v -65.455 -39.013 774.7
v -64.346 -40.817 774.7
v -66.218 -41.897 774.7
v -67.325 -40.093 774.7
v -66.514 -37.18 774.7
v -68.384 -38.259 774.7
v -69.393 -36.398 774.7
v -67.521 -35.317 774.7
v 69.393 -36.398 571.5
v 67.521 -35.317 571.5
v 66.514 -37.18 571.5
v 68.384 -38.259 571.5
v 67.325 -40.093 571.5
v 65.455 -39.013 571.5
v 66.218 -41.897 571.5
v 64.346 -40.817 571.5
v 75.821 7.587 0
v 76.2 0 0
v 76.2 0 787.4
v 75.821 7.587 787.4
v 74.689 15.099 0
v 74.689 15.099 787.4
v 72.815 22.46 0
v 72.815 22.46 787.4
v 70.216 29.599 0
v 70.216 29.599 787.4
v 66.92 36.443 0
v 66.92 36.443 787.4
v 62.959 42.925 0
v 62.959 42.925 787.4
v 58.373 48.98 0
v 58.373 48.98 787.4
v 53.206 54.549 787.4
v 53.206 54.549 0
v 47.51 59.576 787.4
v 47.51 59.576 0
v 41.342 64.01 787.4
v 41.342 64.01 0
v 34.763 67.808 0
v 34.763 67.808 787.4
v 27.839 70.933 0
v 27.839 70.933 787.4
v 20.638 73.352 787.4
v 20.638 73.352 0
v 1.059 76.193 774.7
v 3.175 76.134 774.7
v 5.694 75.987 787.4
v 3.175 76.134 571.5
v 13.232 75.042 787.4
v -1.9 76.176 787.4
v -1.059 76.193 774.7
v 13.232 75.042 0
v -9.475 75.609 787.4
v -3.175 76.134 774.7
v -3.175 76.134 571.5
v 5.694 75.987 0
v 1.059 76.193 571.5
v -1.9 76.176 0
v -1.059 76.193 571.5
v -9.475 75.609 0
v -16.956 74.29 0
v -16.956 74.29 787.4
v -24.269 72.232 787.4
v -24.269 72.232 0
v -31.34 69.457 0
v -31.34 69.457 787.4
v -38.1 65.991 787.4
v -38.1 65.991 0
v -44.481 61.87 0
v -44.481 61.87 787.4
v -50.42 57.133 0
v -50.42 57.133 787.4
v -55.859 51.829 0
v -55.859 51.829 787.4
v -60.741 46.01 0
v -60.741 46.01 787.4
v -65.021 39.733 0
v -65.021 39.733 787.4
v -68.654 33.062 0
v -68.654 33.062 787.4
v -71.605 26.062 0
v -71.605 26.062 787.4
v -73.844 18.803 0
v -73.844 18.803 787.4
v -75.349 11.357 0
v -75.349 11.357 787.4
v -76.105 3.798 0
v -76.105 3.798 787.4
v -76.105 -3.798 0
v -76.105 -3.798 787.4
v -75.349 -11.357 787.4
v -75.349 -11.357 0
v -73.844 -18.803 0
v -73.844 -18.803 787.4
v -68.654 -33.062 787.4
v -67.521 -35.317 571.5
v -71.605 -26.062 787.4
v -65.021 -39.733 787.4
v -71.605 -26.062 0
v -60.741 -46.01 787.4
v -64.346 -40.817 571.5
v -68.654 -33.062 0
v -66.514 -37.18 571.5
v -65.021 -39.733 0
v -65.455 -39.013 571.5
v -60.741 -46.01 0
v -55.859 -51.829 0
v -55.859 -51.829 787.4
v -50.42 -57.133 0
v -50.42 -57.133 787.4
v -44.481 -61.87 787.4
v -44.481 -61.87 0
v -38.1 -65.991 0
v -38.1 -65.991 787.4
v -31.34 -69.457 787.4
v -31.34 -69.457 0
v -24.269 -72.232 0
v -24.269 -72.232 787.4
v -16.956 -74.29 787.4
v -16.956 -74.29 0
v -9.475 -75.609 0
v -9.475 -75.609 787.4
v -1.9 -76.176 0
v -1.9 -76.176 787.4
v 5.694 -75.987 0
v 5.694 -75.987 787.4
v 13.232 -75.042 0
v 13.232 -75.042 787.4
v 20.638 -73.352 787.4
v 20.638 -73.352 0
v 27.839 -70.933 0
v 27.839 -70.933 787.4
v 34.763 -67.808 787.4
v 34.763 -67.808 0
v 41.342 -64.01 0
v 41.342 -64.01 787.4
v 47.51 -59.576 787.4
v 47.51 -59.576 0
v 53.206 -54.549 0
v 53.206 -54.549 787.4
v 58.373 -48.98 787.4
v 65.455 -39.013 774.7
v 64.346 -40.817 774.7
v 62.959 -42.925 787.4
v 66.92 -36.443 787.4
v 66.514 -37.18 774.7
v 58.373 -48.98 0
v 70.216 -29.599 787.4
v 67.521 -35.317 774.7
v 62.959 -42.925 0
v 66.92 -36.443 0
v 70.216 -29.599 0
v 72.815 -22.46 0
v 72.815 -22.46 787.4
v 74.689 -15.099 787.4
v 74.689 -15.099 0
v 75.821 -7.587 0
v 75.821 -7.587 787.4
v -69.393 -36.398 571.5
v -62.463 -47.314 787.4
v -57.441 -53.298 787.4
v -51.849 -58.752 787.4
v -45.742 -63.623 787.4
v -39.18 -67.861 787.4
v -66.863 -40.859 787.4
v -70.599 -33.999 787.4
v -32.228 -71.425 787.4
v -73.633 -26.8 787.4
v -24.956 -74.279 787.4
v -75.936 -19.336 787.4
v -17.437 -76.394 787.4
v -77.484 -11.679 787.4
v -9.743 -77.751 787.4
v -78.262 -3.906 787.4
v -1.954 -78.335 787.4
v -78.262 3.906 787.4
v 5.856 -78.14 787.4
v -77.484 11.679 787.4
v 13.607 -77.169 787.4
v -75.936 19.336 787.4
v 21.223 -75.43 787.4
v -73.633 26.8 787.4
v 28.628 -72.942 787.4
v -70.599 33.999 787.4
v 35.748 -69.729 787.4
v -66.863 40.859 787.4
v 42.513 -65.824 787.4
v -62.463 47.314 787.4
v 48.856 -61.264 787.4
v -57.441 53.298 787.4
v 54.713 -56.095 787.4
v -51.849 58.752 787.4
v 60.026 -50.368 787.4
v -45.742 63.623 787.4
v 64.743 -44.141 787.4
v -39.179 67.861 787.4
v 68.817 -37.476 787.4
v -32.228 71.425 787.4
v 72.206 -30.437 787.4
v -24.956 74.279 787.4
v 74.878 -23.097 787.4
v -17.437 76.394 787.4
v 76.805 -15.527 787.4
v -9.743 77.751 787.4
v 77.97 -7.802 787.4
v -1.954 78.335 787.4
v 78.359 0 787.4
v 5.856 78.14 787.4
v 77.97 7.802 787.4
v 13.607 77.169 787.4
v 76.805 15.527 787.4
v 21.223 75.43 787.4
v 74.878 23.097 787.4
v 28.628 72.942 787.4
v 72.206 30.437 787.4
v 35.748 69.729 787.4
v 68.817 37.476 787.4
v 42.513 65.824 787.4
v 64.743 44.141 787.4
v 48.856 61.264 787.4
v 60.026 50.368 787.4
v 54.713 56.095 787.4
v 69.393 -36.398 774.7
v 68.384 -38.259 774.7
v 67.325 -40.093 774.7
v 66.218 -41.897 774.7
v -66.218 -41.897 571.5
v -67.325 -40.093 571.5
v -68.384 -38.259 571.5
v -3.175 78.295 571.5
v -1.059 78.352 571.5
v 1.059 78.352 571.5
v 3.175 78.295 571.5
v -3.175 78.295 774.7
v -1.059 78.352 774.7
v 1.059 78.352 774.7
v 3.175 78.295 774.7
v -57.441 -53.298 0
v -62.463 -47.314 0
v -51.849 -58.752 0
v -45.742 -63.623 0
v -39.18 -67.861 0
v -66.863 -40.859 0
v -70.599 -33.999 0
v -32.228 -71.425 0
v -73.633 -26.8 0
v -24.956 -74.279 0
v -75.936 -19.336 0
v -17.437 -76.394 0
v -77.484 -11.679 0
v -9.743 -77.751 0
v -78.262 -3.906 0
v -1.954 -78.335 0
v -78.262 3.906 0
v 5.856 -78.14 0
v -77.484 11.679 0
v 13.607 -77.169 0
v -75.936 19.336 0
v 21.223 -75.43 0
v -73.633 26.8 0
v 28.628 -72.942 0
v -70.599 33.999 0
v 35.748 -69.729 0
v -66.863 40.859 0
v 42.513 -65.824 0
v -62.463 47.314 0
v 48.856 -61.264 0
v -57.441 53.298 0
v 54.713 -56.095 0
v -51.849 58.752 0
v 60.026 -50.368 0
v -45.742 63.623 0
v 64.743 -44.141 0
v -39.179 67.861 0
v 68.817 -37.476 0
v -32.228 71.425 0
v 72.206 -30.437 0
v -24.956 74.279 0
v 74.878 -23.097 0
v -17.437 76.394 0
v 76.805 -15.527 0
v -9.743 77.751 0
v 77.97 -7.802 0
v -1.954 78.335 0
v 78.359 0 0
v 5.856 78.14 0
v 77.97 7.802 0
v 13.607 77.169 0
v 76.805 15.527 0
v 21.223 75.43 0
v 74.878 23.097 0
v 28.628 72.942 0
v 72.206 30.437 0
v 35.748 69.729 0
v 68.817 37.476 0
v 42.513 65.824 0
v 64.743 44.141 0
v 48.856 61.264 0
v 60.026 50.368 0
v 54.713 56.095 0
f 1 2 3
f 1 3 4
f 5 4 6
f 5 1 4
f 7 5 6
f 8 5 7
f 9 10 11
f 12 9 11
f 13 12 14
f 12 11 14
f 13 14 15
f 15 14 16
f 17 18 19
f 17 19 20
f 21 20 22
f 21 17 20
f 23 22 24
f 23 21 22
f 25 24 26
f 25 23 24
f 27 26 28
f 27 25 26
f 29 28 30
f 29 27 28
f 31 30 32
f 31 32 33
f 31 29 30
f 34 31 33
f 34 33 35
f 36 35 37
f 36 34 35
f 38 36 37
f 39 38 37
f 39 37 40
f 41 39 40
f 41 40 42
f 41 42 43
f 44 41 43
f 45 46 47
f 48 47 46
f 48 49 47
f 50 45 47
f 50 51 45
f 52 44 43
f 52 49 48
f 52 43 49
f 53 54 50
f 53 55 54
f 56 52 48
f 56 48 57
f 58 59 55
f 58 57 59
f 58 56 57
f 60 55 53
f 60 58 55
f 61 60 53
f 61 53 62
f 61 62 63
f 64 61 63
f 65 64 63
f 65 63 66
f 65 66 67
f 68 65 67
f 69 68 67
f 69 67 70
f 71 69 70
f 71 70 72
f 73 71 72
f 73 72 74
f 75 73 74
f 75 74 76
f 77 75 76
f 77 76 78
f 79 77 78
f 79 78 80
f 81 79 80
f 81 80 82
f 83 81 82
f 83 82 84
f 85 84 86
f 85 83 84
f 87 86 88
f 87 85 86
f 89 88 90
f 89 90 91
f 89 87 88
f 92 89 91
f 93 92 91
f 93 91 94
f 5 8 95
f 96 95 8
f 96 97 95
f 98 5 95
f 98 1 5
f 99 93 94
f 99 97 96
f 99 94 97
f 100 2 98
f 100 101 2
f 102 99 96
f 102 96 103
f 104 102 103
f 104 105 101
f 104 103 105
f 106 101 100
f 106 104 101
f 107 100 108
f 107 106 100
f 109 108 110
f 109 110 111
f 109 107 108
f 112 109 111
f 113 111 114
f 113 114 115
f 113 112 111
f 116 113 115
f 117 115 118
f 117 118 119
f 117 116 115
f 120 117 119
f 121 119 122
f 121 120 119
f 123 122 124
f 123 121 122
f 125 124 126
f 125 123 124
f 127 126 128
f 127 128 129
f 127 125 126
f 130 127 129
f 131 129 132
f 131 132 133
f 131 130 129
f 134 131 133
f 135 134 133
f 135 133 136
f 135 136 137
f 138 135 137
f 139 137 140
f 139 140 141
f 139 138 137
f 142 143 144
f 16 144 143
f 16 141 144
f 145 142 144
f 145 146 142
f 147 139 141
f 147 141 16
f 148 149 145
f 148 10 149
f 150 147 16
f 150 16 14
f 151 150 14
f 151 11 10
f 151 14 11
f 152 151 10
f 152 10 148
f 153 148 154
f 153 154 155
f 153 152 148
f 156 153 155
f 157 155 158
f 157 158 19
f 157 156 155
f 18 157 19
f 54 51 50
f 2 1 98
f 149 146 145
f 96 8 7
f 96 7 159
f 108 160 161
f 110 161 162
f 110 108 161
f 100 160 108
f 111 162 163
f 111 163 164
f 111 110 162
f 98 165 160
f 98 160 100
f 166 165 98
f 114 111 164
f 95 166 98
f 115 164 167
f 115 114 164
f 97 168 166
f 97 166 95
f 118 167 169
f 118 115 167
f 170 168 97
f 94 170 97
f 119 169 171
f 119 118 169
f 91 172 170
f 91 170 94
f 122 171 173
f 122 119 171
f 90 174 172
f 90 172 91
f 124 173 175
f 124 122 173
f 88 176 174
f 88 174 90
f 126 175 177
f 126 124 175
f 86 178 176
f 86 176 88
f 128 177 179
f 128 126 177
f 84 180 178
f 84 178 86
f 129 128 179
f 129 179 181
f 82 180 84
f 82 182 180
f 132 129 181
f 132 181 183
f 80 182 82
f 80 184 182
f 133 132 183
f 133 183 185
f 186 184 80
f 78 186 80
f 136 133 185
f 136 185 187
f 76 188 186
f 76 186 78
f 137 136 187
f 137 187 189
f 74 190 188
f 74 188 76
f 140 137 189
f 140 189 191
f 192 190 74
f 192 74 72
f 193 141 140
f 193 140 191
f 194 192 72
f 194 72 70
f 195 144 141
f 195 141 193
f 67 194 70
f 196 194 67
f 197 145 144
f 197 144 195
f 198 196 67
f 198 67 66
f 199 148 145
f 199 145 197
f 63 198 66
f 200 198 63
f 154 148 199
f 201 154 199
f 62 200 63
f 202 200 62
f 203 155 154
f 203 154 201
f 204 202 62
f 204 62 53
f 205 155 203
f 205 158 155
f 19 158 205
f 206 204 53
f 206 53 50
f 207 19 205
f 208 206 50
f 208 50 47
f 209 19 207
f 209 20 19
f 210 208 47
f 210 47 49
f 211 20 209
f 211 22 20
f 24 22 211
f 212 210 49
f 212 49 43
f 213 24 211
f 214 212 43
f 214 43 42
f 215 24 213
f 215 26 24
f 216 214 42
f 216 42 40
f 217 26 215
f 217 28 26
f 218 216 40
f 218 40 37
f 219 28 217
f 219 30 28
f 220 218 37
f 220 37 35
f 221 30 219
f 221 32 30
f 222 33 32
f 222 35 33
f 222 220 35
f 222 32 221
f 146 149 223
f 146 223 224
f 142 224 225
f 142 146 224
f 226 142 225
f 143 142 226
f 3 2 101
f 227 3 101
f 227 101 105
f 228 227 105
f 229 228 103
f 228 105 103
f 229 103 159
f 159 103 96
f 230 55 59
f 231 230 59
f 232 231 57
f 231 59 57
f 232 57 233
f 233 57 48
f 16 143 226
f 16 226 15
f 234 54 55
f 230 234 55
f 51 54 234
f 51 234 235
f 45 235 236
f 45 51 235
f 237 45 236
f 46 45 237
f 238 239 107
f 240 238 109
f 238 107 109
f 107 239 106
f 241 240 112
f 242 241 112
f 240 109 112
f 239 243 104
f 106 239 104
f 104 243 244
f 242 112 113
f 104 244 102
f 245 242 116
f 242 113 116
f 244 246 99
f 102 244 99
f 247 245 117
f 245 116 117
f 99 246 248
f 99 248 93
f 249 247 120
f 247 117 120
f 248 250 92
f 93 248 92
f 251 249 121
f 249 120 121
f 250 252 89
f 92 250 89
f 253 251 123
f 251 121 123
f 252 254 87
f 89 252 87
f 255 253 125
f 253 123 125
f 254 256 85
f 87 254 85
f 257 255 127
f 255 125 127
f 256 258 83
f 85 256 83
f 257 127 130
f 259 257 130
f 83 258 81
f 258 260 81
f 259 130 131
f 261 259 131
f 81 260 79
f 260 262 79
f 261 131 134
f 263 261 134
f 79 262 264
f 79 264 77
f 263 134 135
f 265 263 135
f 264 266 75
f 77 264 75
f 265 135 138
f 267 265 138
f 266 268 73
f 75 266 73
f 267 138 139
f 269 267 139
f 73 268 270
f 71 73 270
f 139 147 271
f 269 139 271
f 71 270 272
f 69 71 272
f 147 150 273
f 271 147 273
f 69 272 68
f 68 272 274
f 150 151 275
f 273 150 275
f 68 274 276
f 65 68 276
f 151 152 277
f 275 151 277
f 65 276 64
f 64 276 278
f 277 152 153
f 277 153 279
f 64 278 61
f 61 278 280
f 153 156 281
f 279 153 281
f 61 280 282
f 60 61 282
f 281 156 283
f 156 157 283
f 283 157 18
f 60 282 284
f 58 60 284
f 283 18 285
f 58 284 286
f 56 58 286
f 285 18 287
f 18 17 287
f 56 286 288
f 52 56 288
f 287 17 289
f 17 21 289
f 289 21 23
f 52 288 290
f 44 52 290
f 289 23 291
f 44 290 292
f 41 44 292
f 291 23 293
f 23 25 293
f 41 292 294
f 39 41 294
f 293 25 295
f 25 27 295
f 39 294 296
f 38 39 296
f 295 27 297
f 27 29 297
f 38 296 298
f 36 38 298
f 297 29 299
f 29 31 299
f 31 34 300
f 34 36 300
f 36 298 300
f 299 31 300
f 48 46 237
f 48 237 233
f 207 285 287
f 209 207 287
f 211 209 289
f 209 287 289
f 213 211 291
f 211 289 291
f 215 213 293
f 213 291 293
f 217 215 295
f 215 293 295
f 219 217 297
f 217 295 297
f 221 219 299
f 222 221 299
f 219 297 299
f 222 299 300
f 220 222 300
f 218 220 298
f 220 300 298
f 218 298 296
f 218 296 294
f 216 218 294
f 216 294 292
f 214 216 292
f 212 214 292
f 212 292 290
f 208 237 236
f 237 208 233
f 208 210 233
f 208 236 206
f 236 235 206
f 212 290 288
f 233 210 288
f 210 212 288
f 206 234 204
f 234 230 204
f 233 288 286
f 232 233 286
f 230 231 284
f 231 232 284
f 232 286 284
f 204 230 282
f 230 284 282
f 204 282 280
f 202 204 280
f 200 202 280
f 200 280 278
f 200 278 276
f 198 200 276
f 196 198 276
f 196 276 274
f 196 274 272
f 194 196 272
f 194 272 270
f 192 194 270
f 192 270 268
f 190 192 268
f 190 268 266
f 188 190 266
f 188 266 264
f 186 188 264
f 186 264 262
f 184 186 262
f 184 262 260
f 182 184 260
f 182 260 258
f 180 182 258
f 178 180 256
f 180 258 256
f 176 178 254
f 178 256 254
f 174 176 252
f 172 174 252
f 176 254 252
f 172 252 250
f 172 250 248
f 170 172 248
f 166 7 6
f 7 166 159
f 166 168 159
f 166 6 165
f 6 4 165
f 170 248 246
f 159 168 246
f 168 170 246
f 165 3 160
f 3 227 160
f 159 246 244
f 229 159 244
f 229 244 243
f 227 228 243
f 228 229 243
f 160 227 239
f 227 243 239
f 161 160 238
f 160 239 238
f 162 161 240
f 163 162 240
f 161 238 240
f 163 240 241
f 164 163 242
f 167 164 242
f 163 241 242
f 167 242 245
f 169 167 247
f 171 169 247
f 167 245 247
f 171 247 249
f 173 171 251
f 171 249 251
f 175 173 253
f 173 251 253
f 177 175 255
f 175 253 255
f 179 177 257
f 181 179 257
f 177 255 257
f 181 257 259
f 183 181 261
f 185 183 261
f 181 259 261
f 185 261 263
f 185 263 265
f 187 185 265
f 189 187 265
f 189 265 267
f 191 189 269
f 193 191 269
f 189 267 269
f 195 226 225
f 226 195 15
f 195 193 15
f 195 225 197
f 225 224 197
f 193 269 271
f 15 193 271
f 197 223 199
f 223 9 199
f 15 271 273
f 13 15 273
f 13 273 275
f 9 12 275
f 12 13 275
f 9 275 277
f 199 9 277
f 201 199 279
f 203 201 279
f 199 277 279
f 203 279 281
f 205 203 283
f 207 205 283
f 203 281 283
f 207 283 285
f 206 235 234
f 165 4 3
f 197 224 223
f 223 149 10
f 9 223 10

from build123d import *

# Parameters (mm, degrees)
ESQUISSE2_R                  = 78.359
ESQUISSE2_R_2                = 76.2
BOSS_EXTRU_1_DEPTH           = 787.4
ESQUISSE3_W                  = 6.35
ESQUISSE3_H                  = 203.2
ENL_V_MAT_EXTRU_1_DEPTH      = 153.416
R_P_TITION_CIRCULAIRE1_COUNT = 3


with BuildPart() as part:
    # Esquisse2 → Boss.-Extru.1 (new body)
    with BuildSketch(Plane.XY):
        Circle(ESQUISSE2_R)
        Circle(ESQUISSE2_R_2, mode=Mode.SUBTRACT)
    extrude(amount=BOSS_EXTRU_1_DEPTH)

    # Esquisse3 → Enlèv. mat.-Extru.1 (cut)
    with BuildSketch(Plane(origin=(0, 0, 0), x_dir=(1, 0, 0), z_dir=(0, 1, 0))):
        with Locations((0, -673.1)):
            Rectangle(ESQUISSE3_W, ESQUISSE3_H)
    enl_v_mat_extru_1 = extrude(amount=ENL_V_MAT_EXTRU_1_DEPTH, mode=Mode.SUBTRACT)

    # Répétition circulaire1: Enlèv. mat.-Extru.1 ×3 about axis
    r_p_tition_circulaire1_axis = Axis((0, 0, 0), (0, 0, 1))
    for i in range(1, R_P_TITION_CIRCULAIRE1_COUNT):
        add(enl_v_mat_extru_1.rotate(r_p_tition_circulaire1_axis, i * 360 / R_P_TITION_CIRCULAIRE1_COUNT), mode=Mode.SUBTRACT)


solid = part.part
